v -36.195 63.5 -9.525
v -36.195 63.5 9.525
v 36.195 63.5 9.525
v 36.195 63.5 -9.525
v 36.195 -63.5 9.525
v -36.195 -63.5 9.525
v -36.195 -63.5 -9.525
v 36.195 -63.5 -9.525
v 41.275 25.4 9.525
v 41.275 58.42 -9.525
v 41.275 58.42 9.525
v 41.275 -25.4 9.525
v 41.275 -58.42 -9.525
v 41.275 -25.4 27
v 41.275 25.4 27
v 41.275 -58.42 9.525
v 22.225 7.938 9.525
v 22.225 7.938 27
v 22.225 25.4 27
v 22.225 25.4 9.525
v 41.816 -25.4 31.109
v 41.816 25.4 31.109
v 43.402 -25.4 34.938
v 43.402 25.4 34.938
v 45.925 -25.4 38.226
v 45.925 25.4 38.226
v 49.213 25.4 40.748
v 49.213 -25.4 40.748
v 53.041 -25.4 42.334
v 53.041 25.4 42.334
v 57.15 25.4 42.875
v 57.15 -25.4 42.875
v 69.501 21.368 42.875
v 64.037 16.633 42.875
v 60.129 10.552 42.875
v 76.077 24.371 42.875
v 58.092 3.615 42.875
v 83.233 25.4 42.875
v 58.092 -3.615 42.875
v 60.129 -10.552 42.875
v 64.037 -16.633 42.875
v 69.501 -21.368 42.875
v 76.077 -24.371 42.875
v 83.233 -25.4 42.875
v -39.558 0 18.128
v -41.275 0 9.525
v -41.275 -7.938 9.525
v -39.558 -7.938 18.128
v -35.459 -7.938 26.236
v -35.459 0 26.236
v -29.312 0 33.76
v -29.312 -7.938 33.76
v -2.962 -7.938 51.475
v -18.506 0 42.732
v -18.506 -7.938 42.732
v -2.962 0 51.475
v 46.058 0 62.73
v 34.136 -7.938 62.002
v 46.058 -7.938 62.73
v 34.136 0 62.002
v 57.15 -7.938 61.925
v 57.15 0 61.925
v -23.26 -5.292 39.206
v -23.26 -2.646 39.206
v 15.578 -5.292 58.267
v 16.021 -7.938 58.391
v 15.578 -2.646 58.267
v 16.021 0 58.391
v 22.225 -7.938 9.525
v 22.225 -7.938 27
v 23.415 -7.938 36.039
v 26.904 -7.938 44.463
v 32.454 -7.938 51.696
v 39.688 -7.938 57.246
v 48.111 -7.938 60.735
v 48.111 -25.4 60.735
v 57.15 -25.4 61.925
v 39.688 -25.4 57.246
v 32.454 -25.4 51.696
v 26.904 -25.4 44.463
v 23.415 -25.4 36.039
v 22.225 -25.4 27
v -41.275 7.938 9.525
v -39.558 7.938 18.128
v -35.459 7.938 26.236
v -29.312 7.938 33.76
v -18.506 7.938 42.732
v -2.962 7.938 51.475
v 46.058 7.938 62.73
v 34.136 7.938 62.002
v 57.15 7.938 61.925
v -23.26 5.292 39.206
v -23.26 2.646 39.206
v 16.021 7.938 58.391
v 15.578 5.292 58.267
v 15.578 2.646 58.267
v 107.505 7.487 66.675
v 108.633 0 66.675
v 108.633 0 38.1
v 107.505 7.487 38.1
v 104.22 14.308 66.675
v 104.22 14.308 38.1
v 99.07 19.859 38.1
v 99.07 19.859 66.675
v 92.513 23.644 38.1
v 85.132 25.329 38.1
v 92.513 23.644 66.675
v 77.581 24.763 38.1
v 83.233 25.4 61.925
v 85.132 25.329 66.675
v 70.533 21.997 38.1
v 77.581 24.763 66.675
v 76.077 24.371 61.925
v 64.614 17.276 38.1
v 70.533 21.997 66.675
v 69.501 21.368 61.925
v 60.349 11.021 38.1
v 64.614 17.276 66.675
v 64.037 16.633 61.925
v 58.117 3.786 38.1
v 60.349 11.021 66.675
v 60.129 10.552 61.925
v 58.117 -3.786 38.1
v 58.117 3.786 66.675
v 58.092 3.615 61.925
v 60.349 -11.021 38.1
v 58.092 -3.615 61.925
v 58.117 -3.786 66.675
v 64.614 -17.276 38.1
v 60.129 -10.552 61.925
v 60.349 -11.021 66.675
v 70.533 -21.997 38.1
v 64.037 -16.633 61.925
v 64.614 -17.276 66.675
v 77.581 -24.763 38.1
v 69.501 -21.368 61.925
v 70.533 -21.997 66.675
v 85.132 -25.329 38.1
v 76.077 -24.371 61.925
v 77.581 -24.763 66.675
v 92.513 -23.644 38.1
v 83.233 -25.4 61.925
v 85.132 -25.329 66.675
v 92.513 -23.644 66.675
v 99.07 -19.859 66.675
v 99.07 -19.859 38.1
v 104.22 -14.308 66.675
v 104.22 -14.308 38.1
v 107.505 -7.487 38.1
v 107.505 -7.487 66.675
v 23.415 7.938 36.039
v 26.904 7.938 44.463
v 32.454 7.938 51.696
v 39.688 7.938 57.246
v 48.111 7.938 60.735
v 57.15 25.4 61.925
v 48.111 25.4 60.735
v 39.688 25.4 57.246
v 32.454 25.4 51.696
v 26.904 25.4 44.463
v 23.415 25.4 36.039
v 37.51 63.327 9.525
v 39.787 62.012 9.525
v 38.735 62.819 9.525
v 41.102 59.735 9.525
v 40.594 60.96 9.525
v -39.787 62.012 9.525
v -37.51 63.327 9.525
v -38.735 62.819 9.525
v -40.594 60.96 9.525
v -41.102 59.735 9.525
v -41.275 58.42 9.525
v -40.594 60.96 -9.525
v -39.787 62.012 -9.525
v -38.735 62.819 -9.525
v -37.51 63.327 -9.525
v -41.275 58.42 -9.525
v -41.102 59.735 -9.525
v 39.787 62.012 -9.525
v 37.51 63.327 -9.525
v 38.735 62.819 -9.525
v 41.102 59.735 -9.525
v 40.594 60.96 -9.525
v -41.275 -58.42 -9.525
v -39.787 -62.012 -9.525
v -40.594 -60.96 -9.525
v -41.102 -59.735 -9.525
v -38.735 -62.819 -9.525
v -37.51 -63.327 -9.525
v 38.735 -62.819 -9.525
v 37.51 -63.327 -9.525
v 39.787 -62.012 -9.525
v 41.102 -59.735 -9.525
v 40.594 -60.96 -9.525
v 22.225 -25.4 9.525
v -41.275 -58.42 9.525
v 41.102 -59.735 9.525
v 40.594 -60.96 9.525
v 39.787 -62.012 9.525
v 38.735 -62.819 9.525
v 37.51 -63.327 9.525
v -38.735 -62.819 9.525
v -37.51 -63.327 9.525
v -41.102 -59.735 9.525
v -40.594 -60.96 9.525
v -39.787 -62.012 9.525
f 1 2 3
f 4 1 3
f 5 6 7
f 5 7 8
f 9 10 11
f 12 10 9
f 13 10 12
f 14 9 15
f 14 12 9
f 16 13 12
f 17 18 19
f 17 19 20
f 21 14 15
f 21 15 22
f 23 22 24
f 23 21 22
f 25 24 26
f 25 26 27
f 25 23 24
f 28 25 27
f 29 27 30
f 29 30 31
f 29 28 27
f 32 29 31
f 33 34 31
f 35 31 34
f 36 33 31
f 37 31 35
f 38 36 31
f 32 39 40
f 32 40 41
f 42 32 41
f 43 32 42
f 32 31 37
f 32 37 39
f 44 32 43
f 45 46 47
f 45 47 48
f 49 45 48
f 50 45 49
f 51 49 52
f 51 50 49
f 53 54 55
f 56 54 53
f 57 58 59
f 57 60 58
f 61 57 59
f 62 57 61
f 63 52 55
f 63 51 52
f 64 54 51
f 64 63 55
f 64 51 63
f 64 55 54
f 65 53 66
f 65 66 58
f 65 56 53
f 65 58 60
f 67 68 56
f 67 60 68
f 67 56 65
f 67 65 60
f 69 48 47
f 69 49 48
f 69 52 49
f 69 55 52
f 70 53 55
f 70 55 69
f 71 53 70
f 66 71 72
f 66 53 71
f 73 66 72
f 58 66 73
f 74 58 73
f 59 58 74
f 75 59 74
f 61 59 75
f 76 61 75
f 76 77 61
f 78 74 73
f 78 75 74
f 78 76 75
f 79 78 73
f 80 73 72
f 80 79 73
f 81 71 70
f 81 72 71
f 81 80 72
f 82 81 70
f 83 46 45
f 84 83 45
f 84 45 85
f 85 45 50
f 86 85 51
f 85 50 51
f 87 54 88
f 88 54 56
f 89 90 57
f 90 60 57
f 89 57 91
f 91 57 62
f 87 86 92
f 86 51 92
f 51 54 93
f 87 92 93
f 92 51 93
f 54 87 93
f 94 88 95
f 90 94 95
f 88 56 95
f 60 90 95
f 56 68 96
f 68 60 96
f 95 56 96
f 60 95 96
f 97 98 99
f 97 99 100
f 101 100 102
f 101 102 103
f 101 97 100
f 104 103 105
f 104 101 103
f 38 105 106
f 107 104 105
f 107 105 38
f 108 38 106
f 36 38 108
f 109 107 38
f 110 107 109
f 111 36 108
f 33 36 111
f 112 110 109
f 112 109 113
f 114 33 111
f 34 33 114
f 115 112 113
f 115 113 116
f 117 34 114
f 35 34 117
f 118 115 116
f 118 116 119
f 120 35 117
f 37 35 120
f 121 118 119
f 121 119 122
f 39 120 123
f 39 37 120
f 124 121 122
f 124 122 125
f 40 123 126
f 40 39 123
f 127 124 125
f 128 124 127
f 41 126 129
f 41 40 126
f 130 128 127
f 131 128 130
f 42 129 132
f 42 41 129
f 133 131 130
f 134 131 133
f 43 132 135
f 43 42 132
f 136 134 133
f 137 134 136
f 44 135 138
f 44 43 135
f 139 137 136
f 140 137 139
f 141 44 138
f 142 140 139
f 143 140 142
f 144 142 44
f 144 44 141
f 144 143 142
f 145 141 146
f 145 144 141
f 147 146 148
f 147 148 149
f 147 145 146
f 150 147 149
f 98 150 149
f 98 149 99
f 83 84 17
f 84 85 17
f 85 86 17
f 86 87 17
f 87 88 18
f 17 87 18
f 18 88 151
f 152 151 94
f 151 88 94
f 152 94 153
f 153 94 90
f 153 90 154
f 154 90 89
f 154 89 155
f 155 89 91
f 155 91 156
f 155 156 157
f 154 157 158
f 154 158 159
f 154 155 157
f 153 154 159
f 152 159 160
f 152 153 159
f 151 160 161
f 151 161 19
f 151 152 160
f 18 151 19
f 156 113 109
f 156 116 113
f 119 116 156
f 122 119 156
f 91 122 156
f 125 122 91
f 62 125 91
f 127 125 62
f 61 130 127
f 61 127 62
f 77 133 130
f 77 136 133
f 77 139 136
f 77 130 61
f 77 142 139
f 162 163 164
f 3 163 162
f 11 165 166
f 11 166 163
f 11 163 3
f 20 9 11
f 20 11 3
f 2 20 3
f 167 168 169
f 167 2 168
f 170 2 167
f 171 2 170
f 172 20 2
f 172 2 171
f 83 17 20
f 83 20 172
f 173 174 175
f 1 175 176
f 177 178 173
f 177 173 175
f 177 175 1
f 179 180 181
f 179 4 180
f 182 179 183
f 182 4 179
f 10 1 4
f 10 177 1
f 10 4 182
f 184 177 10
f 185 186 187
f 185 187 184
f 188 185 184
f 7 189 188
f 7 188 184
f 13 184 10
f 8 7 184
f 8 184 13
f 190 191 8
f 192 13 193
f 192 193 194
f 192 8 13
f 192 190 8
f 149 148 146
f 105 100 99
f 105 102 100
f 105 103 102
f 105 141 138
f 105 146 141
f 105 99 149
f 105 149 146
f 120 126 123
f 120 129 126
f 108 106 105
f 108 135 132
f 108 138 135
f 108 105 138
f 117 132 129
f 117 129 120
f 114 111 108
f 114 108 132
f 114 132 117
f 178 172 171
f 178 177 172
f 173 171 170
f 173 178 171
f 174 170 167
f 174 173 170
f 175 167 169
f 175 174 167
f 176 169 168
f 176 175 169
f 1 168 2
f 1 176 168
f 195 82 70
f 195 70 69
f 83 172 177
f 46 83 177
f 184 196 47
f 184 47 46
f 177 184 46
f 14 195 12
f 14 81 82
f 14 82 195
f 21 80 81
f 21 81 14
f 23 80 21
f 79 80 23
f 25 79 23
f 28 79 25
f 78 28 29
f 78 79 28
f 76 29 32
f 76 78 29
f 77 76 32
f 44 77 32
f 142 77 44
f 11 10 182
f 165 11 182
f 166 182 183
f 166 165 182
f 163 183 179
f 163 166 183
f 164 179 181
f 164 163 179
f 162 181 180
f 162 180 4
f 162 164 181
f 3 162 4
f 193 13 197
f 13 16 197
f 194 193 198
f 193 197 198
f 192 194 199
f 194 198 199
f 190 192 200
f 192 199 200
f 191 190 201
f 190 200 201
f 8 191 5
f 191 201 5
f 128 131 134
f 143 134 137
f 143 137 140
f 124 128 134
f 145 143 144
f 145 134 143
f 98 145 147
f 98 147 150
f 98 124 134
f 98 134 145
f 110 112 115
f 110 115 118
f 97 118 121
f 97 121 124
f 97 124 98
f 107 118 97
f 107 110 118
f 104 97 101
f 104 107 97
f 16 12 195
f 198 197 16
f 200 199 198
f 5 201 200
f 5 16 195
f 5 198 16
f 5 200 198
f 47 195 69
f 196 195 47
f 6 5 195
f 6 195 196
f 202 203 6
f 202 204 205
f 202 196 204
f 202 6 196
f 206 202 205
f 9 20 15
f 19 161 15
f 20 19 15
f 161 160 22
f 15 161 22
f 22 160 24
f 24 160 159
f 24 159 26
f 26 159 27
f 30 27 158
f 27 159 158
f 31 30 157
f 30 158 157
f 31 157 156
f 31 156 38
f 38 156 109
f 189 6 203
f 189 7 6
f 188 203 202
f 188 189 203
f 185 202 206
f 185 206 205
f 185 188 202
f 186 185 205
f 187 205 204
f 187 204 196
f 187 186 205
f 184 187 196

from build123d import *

# Parameters (mm, degrees)
F1_DEPTH = 63.5
F2_DEPTH = 25.4
F3_DEPTH = 7.9375
F5_R     = 5.08


# Not quite as in the source:
# - ends of sketch curves that miss each other by under 0.0002 mm in the source are joined


with BuildPart() as f1:
    # F0 (on Front) → F1 (new body, symmetric)
    with BuildSketch(Plane.XZ):
        Polygon((41.275, -9.525), (41.275, 9.525), (22.225, 9.525), (-41.275, 9.525), (-41.275, -9.525), align=None)
    extrude(amount=F1_DEPTH, both=True)

    # F0 (on Front) → F2 (join, symmetric)
    with BuildSketch(Plane.XZ):
        with BuildLine():
            Line((22.225, 9.525), (41.275, 9.525))
            Line((41.275, 9.525), (41.275, 27.0002))
            ThreePointArc((41.275, 27.0002), (45.9246798487, 38.2255201513), (57.15, 42.8752))
            Line((57.15, 42.8752), (57.8334331512, 42.8752))
            Line((57.8334331512, 42.8752), (57.8334331512, 61.9252))
            Line((57.8334331512, 61.9252), (57.15, 61.9252))
            ThreePointArc((57.15, 61.9252), (32.4542956671, 51.6959043329), (22.225, 27.0002))
            Line((22.225, 27.0002), (22.225, 9.525))
        make_face()
        Polygon((57.8334331512, 61.9252), (57.8334331512, 42.8752), (83.2334309816, 42.8752), (83.2334331512, 61.9252), align=None)
    extrude(amount=F2_DEPTH, both=True)

    # F0 (on Front) → F3 (join, symmetric)
    with BuildSketch(Plane.XZ):
        with BuildLine():
            Line((-41.275, 9.525), (22.225, 9.525))
            Line((22.225, 9.525), (22.225, 27.0002))
            ThreePointArc((22.225, 27.0002), (32.4542956671, 51.6959043329), (57.15, 61.9252))
            add(Edge.make_bspline(
                [(-41.275, 9.525), (-39.7025756538, 42.9233573377), (20.2414225787, 67.5613582134), (57.15, 61.9252)],
                knots=[0, 0, 0, 0, 111.5045361635, 111.5045361635, 111.5045361635, 111.5045361635], degree=3))
        make_face()
    extrude(amount=F3_DEPTH, both=True)

    # F0 (on Front) → F4 (revolve)
    with BuildSketch(Plane.XZ):
        Polygon((83.2334331512, 61.9252), (83.2334331512, 42.8752), (83.2334331512, 38.1), (108.6334331512, 38.1), (108.6334331512, 66.675), (83.2334331512, 66.675), align=None)
    revolve(axis=Axis((83.2334331512, 0, 52.3875), (0, 0, 1)))

    # F5
    f5_edges = [f1.edges().sort_by_distance(p)[0] for p in [
        (-41.275, -63.5, 0),
        (41.275, -63.5, 0),
        (-41.275, 63.5, 0),
        (41.275, 63.5, 0),
    ]]
    fillet(f5_edges, radius=F5_R)


solid = f1.part
